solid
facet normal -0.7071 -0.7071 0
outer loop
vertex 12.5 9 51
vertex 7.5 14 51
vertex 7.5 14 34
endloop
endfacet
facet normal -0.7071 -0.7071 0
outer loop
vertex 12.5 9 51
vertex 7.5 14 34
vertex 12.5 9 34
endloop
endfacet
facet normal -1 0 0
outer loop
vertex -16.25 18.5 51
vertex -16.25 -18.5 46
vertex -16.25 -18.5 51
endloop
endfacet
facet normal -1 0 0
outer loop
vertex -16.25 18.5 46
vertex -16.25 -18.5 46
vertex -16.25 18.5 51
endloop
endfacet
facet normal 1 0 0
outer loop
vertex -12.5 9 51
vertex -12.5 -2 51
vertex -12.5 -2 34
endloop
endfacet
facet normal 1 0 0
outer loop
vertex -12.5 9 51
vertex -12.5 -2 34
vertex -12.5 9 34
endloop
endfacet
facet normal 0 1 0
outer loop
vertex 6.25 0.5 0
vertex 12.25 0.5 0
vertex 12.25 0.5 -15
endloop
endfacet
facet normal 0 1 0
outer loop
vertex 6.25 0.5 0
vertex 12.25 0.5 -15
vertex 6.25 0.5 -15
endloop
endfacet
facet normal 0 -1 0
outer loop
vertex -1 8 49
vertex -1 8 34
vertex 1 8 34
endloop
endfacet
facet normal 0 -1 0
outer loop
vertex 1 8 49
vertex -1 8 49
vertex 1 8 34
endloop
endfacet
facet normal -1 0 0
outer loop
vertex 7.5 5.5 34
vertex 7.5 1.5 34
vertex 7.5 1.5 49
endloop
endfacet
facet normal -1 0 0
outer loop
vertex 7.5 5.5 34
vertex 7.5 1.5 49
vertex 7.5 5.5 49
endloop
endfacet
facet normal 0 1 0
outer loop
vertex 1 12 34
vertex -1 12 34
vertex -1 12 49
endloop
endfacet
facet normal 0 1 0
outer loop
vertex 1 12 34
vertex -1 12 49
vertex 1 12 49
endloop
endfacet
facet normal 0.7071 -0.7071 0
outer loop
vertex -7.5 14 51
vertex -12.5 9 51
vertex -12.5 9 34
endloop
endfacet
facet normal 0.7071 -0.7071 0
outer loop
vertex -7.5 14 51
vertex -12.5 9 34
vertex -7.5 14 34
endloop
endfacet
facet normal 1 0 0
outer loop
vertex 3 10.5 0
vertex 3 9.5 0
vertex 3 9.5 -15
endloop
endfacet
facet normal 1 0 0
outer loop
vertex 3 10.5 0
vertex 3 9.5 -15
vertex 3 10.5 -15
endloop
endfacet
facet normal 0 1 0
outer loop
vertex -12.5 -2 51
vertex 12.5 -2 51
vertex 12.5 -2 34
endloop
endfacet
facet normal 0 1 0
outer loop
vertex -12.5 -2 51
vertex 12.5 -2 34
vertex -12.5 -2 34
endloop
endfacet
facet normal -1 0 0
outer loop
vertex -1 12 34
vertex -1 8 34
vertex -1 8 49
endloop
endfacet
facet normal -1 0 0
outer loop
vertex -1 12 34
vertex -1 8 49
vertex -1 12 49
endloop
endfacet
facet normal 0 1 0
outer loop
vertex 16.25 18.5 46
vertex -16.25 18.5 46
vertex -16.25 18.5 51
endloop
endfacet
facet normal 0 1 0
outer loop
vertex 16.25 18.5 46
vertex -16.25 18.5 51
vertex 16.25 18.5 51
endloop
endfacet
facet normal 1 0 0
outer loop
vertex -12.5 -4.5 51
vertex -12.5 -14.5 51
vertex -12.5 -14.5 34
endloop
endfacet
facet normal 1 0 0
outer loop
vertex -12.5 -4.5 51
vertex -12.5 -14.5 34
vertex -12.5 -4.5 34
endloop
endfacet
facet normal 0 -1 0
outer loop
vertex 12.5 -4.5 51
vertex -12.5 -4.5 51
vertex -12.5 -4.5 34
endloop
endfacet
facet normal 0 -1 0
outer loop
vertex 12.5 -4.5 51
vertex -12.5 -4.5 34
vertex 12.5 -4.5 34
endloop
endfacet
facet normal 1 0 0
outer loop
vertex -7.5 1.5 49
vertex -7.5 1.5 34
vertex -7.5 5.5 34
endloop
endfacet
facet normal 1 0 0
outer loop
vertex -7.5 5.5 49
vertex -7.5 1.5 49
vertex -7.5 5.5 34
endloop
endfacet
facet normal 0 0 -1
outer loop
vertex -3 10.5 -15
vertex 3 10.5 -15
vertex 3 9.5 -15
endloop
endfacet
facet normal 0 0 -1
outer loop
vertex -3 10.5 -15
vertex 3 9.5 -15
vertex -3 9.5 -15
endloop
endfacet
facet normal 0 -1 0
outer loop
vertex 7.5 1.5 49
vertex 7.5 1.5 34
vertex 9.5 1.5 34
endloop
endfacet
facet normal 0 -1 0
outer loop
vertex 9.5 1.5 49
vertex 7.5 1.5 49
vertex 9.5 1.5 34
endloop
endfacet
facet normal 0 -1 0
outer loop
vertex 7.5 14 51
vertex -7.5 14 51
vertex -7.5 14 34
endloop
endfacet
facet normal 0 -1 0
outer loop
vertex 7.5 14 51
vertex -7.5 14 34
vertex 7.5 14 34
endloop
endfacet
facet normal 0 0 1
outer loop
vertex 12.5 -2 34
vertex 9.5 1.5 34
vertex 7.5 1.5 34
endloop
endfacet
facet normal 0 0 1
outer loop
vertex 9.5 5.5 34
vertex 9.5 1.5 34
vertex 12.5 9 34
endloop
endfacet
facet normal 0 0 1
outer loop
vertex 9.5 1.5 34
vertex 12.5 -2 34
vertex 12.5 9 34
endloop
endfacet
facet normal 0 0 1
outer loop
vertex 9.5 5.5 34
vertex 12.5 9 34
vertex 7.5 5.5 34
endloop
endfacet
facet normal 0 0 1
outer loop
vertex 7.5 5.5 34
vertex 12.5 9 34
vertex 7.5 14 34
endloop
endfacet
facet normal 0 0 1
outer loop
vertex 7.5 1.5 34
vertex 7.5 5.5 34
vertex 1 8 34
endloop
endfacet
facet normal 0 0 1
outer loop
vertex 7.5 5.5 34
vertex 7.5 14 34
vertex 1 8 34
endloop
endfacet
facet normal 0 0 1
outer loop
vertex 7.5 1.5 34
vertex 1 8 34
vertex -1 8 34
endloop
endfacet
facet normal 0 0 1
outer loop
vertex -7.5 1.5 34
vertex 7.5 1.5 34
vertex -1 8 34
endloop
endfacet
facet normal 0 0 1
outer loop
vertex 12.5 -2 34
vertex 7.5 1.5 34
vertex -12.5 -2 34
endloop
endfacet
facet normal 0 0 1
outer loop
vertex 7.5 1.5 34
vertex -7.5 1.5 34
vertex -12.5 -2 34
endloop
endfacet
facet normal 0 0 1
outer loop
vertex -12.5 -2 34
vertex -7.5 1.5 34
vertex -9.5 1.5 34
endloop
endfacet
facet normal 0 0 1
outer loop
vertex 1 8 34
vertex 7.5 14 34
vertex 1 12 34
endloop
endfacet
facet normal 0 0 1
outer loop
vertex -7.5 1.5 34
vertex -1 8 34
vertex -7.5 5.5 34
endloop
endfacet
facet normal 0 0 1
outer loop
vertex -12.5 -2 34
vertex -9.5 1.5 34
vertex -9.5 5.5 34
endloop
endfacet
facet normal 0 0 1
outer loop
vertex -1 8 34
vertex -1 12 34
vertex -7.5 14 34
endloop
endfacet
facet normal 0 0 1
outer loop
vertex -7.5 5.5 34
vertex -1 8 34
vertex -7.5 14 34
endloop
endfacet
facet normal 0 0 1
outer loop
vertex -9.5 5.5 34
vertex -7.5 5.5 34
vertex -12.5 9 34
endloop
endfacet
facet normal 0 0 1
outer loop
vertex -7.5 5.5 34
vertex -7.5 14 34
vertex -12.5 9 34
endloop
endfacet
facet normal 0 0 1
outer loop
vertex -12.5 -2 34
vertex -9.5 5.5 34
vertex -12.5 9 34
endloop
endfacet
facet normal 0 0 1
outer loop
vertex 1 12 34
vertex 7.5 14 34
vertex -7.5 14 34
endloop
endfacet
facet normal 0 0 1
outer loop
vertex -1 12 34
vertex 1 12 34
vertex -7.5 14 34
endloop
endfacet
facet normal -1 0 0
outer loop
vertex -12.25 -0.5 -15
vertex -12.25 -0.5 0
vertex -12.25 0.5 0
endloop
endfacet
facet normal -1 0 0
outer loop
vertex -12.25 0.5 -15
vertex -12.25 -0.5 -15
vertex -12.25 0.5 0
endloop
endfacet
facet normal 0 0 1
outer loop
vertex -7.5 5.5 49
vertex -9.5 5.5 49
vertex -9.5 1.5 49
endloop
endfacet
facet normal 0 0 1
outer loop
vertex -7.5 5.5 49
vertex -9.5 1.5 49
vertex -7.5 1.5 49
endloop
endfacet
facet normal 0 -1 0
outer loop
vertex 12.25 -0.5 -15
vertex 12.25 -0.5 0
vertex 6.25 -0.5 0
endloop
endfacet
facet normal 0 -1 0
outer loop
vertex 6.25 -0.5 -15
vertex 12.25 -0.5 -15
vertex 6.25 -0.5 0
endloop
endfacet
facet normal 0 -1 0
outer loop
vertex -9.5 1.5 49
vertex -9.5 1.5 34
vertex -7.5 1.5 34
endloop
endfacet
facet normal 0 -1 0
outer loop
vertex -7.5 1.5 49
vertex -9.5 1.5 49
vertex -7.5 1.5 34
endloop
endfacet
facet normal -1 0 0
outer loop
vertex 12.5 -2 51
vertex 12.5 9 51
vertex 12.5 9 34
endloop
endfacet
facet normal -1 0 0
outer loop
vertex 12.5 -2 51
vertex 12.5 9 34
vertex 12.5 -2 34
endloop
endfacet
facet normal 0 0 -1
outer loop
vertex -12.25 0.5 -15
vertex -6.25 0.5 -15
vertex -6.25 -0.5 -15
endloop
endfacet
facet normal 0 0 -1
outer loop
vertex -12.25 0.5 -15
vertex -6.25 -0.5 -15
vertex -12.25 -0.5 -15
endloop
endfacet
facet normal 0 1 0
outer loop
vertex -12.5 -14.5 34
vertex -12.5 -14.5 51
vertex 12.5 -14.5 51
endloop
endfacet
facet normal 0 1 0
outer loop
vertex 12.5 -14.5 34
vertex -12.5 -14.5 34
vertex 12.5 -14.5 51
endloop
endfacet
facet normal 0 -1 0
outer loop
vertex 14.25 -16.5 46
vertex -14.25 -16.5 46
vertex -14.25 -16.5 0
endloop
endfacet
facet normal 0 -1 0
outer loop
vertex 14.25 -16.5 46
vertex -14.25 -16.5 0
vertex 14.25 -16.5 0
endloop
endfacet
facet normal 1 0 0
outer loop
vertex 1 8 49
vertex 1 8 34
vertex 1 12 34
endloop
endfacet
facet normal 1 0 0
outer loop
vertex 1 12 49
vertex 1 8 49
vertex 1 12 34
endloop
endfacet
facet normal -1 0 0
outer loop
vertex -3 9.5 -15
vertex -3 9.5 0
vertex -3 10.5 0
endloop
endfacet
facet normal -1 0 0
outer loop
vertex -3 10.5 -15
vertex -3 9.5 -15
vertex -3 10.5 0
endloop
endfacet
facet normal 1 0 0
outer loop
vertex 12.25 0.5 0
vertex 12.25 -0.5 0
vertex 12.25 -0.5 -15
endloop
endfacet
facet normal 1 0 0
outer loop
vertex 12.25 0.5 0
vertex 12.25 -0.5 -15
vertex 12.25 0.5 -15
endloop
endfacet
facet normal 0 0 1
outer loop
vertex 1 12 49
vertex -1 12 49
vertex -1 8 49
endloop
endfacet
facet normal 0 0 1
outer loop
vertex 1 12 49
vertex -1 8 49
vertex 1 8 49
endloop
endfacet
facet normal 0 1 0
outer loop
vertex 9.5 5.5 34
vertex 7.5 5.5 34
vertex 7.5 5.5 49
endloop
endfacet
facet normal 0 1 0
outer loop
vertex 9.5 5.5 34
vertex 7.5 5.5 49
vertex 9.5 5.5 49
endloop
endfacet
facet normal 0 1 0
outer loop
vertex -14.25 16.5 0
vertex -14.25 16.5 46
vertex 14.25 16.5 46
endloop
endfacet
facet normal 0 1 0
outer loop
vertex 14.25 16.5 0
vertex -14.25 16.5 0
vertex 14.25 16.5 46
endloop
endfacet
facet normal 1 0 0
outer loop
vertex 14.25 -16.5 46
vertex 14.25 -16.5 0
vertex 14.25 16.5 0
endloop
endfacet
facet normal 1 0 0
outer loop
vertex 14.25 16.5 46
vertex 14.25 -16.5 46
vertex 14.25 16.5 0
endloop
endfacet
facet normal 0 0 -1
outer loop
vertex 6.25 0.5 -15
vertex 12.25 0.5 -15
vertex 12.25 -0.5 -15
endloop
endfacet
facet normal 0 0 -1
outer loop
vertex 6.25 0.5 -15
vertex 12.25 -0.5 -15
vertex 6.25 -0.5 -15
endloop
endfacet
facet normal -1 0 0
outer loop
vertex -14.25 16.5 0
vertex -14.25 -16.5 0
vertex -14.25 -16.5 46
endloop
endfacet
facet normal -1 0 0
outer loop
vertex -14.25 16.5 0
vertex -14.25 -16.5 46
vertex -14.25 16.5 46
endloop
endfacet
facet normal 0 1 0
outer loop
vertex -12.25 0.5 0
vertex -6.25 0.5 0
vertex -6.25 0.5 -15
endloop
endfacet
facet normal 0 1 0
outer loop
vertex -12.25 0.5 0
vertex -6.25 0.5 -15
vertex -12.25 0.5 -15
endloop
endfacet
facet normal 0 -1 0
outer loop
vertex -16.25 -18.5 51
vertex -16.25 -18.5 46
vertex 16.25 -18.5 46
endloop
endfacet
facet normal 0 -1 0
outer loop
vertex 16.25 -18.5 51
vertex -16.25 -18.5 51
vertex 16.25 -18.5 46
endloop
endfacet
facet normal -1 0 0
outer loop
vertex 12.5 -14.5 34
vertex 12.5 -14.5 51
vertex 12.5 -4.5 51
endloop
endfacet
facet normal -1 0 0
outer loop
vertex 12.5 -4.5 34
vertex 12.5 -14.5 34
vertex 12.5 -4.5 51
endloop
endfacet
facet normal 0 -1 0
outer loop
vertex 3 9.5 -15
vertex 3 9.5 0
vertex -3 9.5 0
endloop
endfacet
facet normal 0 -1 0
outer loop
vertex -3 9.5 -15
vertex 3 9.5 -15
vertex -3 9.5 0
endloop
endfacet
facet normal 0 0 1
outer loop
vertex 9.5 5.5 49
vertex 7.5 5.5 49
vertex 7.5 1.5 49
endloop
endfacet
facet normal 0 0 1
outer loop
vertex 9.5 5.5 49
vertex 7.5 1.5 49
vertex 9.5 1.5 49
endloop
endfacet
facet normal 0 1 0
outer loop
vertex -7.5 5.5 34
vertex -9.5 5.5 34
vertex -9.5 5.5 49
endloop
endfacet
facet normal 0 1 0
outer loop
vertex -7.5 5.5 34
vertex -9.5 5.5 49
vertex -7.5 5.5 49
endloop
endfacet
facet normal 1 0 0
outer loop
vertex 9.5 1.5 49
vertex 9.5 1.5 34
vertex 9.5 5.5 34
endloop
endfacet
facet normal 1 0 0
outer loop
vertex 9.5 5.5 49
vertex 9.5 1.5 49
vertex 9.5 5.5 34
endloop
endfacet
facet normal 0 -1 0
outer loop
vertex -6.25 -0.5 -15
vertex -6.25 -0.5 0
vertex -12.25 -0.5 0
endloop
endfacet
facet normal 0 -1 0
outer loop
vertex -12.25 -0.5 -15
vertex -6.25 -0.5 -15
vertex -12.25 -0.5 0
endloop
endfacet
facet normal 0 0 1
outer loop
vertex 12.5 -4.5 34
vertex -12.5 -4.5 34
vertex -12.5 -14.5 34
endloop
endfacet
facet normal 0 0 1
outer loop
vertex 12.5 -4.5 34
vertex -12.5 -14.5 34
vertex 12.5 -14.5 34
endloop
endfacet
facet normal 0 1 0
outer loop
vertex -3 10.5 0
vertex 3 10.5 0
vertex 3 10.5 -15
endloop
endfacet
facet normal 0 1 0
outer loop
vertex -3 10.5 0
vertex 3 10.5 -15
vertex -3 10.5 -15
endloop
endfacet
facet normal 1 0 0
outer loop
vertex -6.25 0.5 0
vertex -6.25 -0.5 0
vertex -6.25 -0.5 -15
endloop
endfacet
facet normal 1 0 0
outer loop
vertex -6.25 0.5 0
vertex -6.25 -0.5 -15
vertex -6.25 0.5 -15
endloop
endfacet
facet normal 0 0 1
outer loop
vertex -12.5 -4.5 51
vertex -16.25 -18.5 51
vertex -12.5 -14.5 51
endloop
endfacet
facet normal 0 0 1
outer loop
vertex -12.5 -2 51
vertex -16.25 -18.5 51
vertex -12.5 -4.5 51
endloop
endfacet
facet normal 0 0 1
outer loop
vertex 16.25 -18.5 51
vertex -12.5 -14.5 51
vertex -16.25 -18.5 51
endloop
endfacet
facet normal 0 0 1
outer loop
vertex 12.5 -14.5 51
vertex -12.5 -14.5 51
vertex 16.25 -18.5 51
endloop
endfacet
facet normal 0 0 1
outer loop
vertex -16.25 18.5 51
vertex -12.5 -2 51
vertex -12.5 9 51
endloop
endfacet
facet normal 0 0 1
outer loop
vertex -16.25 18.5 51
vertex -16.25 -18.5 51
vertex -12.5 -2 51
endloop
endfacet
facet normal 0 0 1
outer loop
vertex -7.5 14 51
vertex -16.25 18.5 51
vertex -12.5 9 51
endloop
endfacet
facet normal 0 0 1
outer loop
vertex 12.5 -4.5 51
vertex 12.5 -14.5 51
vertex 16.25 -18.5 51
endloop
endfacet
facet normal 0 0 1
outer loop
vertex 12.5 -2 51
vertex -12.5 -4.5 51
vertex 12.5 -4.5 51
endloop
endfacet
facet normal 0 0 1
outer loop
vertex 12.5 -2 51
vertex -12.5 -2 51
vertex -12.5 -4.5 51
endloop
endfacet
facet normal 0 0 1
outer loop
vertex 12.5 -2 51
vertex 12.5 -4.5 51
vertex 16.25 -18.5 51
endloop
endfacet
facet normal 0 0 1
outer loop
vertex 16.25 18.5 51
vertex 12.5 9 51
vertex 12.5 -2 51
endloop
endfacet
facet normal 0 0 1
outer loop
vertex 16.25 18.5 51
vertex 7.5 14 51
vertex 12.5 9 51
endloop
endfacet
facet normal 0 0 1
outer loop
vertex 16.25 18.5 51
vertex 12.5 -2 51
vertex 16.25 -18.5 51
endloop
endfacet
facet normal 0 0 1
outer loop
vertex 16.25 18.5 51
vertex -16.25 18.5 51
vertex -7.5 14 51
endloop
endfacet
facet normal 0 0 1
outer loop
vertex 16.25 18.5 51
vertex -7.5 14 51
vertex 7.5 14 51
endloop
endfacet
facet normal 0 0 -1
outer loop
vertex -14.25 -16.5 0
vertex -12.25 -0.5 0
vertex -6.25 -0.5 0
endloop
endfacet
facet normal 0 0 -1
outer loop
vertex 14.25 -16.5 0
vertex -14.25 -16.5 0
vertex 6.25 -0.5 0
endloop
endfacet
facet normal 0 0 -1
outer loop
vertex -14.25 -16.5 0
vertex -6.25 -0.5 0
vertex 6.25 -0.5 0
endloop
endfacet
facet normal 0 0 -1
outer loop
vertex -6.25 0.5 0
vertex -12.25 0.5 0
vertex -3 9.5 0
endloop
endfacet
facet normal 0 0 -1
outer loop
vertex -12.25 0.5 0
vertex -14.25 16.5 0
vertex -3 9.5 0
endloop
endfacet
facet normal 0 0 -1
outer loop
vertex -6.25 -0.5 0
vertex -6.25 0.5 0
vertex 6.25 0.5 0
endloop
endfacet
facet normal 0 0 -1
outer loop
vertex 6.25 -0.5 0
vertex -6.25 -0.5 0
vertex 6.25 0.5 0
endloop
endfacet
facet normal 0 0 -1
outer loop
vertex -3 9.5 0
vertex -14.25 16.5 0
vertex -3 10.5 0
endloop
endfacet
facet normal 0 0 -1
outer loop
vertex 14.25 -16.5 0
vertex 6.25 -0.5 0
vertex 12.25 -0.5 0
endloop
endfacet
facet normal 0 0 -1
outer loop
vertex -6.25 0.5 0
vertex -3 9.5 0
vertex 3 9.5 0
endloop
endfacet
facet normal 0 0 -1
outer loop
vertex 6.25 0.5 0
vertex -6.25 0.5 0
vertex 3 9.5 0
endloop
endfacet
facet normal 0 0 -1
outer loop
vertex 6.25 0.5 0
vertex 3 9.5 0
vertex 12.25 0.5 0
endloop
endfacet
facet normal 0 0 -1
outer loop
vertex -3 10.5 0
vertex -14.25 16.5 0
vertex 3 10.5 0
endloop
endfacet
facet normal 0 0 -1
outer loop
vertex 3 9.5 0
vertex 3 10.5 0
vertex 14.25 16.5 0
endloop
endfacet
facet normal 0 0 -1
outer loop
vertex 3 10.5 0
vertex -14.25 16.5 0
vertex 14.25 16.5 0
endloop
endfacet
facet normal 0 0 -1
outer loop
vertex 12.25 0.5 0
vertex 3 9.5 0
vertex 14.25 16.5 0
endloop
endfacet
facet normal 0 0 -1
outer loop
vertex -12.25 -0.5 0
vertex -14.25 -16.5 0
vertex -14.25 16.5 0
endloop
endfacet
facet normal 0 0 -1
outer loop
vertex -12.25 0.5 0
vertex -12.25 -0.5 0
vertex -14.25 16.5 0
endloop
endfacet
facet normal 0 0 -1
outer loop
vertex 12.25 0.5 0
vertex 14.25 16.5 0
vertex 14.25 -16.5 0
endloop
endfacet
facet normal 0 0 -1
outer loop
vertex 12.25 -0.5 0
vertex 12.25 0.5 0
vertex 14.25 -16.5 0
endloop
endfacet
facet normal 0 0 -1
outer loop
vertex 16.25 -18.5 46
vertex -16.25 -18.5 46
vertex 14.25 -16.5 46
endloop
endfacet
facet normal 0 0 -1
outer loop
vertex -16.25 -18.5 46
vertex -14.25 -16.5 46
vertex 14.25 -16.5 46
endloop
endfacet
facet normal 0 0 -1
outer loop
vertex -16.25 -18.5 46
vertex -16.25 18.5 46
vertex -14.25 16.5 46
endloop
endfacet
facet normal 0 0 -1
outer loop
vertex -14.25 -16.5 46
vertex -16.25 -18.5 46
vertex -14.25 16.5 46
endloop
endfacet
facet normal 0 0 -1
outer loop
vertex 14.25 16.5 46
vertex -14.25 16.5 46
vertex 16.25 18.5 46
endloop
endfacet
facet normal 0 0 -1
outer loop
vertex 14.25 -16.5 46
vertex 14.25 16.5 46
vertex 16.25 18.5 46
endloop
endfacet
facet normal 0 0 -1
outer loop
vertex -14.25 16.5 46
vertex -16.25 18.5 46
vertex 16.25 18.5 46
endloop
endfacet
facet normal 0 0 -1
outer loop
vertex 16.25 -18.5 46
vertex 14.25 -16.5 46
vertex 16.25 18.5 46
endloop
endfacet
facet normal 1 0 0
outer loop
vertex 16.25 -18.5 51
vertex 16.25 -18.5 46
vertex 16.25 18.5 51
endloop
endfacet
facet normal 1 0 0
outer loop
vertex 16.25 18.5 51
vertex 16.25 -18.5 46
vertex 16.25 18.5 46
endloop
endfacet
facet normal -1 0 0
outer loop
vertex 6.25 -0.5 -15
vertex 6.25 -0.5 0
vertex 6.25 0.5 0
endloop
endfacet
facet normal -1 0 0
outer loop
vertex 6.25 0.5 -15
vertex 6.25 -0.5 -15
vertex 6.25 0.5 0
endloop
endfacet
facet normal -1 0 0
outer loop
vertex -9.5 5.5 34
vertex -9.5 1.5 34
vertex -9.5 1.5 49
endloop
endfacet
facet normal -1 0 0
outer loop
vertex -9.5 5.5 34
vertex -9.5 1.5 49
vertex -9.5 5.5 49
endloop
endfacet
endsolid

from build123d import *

# Parameters (mm, degrees)
SKETCH1_W           = 28.5
SKETCH1_H           = 33
BOSS_EXTRUDE1_DEPTH = 46
SKETCH2_W           = 32.5
SKETCH2_H           = 37
BOSS_EXTRUDE2_DEPTH = 5
SKETCH3_W           = 25
SKETCH3_H           = 10
CUT_EXTRUDE1_DEPTH  = 17
SKETCH4_W           = 2
SKETCH4_H           = 4
BOSS_EXTRUDE3_DEPTH = 15
SKETCH5_W           = 6
SKETCH5_H           = 1
BOSS_EXTRUDE4_DEPTH = 15


with BuildPart() as part:
    # Sketch1 → Boss-Extrude1 (new body)
    with BuildSketch(Plane.XY):
        Rectangle(SKETCH1_W, SKETCH1_H)
    extrude(amount=BOSS_EXTRUDE1_DEPTH)

    # Sketch2 → Boss-Extrude2 (add)
    with BuildSketch(Plane.XY.offset(46)):
        Rectangle(SKETCH2_W, SKETCH2_H)
    extrude(amount=BOSS_EXTRUDE2_DEPTH)

    # Sketch3 → Cut-Extrude1 (cut)
    with BuildSketch(Plane.XY.offset(51)):
        Polygon((12.5, -2), (-12.5, -2), (-12.5, 9), (-7.5, 14), (7.5, 14), (12.5, 9), align=None)
        with Locations((0, -9.5)):
            Rectangle(SKETCH3_W, SKETCH3_H)
    extrude(amount=-CUT_EXTRUDE1_DEPTH, mode=Mode.SUBTRACT)

    # Sketch4 → Boss-Extrude3 (add)
    with BuildSketch(Plane.XY.offset(34)):
        with Locations((-8.5, 3.5)):
            Rectangle(SKETCH4_W, SKETCH4_H)
        with Locations((0, 10)):
            Rectangle(SKETCH4_W, SKETCH4_H)
        with Locations((8.5, 3.5)):
            Rectangle(SKETCH4_W, SKETCH4_H)
    extrude(amount=BOSS_EXTRUDE3_DEPTH)

    # Sketch5 → Boss-Extrude4 (add)
    with BuildSketch(Plane(origin=(0, 0, 0), x_dir=(-1, 0, 0), z_dir=(0, 0, -1))):
        with Locations((-9.25, 0)):
            Rectangle(SKETCH5_W, SKETCH5_H)
        with Locations((0, 10)):
            Rectangle(SKETCH5_W, SKETCH5_H)
        with Locations((9.25, 0)):
            Rectangle(SKETCH5_W, SKETCH5_H)
    extrude(amount=BOSS_EXTRUDE4_DEPTH)


solid = part.part
